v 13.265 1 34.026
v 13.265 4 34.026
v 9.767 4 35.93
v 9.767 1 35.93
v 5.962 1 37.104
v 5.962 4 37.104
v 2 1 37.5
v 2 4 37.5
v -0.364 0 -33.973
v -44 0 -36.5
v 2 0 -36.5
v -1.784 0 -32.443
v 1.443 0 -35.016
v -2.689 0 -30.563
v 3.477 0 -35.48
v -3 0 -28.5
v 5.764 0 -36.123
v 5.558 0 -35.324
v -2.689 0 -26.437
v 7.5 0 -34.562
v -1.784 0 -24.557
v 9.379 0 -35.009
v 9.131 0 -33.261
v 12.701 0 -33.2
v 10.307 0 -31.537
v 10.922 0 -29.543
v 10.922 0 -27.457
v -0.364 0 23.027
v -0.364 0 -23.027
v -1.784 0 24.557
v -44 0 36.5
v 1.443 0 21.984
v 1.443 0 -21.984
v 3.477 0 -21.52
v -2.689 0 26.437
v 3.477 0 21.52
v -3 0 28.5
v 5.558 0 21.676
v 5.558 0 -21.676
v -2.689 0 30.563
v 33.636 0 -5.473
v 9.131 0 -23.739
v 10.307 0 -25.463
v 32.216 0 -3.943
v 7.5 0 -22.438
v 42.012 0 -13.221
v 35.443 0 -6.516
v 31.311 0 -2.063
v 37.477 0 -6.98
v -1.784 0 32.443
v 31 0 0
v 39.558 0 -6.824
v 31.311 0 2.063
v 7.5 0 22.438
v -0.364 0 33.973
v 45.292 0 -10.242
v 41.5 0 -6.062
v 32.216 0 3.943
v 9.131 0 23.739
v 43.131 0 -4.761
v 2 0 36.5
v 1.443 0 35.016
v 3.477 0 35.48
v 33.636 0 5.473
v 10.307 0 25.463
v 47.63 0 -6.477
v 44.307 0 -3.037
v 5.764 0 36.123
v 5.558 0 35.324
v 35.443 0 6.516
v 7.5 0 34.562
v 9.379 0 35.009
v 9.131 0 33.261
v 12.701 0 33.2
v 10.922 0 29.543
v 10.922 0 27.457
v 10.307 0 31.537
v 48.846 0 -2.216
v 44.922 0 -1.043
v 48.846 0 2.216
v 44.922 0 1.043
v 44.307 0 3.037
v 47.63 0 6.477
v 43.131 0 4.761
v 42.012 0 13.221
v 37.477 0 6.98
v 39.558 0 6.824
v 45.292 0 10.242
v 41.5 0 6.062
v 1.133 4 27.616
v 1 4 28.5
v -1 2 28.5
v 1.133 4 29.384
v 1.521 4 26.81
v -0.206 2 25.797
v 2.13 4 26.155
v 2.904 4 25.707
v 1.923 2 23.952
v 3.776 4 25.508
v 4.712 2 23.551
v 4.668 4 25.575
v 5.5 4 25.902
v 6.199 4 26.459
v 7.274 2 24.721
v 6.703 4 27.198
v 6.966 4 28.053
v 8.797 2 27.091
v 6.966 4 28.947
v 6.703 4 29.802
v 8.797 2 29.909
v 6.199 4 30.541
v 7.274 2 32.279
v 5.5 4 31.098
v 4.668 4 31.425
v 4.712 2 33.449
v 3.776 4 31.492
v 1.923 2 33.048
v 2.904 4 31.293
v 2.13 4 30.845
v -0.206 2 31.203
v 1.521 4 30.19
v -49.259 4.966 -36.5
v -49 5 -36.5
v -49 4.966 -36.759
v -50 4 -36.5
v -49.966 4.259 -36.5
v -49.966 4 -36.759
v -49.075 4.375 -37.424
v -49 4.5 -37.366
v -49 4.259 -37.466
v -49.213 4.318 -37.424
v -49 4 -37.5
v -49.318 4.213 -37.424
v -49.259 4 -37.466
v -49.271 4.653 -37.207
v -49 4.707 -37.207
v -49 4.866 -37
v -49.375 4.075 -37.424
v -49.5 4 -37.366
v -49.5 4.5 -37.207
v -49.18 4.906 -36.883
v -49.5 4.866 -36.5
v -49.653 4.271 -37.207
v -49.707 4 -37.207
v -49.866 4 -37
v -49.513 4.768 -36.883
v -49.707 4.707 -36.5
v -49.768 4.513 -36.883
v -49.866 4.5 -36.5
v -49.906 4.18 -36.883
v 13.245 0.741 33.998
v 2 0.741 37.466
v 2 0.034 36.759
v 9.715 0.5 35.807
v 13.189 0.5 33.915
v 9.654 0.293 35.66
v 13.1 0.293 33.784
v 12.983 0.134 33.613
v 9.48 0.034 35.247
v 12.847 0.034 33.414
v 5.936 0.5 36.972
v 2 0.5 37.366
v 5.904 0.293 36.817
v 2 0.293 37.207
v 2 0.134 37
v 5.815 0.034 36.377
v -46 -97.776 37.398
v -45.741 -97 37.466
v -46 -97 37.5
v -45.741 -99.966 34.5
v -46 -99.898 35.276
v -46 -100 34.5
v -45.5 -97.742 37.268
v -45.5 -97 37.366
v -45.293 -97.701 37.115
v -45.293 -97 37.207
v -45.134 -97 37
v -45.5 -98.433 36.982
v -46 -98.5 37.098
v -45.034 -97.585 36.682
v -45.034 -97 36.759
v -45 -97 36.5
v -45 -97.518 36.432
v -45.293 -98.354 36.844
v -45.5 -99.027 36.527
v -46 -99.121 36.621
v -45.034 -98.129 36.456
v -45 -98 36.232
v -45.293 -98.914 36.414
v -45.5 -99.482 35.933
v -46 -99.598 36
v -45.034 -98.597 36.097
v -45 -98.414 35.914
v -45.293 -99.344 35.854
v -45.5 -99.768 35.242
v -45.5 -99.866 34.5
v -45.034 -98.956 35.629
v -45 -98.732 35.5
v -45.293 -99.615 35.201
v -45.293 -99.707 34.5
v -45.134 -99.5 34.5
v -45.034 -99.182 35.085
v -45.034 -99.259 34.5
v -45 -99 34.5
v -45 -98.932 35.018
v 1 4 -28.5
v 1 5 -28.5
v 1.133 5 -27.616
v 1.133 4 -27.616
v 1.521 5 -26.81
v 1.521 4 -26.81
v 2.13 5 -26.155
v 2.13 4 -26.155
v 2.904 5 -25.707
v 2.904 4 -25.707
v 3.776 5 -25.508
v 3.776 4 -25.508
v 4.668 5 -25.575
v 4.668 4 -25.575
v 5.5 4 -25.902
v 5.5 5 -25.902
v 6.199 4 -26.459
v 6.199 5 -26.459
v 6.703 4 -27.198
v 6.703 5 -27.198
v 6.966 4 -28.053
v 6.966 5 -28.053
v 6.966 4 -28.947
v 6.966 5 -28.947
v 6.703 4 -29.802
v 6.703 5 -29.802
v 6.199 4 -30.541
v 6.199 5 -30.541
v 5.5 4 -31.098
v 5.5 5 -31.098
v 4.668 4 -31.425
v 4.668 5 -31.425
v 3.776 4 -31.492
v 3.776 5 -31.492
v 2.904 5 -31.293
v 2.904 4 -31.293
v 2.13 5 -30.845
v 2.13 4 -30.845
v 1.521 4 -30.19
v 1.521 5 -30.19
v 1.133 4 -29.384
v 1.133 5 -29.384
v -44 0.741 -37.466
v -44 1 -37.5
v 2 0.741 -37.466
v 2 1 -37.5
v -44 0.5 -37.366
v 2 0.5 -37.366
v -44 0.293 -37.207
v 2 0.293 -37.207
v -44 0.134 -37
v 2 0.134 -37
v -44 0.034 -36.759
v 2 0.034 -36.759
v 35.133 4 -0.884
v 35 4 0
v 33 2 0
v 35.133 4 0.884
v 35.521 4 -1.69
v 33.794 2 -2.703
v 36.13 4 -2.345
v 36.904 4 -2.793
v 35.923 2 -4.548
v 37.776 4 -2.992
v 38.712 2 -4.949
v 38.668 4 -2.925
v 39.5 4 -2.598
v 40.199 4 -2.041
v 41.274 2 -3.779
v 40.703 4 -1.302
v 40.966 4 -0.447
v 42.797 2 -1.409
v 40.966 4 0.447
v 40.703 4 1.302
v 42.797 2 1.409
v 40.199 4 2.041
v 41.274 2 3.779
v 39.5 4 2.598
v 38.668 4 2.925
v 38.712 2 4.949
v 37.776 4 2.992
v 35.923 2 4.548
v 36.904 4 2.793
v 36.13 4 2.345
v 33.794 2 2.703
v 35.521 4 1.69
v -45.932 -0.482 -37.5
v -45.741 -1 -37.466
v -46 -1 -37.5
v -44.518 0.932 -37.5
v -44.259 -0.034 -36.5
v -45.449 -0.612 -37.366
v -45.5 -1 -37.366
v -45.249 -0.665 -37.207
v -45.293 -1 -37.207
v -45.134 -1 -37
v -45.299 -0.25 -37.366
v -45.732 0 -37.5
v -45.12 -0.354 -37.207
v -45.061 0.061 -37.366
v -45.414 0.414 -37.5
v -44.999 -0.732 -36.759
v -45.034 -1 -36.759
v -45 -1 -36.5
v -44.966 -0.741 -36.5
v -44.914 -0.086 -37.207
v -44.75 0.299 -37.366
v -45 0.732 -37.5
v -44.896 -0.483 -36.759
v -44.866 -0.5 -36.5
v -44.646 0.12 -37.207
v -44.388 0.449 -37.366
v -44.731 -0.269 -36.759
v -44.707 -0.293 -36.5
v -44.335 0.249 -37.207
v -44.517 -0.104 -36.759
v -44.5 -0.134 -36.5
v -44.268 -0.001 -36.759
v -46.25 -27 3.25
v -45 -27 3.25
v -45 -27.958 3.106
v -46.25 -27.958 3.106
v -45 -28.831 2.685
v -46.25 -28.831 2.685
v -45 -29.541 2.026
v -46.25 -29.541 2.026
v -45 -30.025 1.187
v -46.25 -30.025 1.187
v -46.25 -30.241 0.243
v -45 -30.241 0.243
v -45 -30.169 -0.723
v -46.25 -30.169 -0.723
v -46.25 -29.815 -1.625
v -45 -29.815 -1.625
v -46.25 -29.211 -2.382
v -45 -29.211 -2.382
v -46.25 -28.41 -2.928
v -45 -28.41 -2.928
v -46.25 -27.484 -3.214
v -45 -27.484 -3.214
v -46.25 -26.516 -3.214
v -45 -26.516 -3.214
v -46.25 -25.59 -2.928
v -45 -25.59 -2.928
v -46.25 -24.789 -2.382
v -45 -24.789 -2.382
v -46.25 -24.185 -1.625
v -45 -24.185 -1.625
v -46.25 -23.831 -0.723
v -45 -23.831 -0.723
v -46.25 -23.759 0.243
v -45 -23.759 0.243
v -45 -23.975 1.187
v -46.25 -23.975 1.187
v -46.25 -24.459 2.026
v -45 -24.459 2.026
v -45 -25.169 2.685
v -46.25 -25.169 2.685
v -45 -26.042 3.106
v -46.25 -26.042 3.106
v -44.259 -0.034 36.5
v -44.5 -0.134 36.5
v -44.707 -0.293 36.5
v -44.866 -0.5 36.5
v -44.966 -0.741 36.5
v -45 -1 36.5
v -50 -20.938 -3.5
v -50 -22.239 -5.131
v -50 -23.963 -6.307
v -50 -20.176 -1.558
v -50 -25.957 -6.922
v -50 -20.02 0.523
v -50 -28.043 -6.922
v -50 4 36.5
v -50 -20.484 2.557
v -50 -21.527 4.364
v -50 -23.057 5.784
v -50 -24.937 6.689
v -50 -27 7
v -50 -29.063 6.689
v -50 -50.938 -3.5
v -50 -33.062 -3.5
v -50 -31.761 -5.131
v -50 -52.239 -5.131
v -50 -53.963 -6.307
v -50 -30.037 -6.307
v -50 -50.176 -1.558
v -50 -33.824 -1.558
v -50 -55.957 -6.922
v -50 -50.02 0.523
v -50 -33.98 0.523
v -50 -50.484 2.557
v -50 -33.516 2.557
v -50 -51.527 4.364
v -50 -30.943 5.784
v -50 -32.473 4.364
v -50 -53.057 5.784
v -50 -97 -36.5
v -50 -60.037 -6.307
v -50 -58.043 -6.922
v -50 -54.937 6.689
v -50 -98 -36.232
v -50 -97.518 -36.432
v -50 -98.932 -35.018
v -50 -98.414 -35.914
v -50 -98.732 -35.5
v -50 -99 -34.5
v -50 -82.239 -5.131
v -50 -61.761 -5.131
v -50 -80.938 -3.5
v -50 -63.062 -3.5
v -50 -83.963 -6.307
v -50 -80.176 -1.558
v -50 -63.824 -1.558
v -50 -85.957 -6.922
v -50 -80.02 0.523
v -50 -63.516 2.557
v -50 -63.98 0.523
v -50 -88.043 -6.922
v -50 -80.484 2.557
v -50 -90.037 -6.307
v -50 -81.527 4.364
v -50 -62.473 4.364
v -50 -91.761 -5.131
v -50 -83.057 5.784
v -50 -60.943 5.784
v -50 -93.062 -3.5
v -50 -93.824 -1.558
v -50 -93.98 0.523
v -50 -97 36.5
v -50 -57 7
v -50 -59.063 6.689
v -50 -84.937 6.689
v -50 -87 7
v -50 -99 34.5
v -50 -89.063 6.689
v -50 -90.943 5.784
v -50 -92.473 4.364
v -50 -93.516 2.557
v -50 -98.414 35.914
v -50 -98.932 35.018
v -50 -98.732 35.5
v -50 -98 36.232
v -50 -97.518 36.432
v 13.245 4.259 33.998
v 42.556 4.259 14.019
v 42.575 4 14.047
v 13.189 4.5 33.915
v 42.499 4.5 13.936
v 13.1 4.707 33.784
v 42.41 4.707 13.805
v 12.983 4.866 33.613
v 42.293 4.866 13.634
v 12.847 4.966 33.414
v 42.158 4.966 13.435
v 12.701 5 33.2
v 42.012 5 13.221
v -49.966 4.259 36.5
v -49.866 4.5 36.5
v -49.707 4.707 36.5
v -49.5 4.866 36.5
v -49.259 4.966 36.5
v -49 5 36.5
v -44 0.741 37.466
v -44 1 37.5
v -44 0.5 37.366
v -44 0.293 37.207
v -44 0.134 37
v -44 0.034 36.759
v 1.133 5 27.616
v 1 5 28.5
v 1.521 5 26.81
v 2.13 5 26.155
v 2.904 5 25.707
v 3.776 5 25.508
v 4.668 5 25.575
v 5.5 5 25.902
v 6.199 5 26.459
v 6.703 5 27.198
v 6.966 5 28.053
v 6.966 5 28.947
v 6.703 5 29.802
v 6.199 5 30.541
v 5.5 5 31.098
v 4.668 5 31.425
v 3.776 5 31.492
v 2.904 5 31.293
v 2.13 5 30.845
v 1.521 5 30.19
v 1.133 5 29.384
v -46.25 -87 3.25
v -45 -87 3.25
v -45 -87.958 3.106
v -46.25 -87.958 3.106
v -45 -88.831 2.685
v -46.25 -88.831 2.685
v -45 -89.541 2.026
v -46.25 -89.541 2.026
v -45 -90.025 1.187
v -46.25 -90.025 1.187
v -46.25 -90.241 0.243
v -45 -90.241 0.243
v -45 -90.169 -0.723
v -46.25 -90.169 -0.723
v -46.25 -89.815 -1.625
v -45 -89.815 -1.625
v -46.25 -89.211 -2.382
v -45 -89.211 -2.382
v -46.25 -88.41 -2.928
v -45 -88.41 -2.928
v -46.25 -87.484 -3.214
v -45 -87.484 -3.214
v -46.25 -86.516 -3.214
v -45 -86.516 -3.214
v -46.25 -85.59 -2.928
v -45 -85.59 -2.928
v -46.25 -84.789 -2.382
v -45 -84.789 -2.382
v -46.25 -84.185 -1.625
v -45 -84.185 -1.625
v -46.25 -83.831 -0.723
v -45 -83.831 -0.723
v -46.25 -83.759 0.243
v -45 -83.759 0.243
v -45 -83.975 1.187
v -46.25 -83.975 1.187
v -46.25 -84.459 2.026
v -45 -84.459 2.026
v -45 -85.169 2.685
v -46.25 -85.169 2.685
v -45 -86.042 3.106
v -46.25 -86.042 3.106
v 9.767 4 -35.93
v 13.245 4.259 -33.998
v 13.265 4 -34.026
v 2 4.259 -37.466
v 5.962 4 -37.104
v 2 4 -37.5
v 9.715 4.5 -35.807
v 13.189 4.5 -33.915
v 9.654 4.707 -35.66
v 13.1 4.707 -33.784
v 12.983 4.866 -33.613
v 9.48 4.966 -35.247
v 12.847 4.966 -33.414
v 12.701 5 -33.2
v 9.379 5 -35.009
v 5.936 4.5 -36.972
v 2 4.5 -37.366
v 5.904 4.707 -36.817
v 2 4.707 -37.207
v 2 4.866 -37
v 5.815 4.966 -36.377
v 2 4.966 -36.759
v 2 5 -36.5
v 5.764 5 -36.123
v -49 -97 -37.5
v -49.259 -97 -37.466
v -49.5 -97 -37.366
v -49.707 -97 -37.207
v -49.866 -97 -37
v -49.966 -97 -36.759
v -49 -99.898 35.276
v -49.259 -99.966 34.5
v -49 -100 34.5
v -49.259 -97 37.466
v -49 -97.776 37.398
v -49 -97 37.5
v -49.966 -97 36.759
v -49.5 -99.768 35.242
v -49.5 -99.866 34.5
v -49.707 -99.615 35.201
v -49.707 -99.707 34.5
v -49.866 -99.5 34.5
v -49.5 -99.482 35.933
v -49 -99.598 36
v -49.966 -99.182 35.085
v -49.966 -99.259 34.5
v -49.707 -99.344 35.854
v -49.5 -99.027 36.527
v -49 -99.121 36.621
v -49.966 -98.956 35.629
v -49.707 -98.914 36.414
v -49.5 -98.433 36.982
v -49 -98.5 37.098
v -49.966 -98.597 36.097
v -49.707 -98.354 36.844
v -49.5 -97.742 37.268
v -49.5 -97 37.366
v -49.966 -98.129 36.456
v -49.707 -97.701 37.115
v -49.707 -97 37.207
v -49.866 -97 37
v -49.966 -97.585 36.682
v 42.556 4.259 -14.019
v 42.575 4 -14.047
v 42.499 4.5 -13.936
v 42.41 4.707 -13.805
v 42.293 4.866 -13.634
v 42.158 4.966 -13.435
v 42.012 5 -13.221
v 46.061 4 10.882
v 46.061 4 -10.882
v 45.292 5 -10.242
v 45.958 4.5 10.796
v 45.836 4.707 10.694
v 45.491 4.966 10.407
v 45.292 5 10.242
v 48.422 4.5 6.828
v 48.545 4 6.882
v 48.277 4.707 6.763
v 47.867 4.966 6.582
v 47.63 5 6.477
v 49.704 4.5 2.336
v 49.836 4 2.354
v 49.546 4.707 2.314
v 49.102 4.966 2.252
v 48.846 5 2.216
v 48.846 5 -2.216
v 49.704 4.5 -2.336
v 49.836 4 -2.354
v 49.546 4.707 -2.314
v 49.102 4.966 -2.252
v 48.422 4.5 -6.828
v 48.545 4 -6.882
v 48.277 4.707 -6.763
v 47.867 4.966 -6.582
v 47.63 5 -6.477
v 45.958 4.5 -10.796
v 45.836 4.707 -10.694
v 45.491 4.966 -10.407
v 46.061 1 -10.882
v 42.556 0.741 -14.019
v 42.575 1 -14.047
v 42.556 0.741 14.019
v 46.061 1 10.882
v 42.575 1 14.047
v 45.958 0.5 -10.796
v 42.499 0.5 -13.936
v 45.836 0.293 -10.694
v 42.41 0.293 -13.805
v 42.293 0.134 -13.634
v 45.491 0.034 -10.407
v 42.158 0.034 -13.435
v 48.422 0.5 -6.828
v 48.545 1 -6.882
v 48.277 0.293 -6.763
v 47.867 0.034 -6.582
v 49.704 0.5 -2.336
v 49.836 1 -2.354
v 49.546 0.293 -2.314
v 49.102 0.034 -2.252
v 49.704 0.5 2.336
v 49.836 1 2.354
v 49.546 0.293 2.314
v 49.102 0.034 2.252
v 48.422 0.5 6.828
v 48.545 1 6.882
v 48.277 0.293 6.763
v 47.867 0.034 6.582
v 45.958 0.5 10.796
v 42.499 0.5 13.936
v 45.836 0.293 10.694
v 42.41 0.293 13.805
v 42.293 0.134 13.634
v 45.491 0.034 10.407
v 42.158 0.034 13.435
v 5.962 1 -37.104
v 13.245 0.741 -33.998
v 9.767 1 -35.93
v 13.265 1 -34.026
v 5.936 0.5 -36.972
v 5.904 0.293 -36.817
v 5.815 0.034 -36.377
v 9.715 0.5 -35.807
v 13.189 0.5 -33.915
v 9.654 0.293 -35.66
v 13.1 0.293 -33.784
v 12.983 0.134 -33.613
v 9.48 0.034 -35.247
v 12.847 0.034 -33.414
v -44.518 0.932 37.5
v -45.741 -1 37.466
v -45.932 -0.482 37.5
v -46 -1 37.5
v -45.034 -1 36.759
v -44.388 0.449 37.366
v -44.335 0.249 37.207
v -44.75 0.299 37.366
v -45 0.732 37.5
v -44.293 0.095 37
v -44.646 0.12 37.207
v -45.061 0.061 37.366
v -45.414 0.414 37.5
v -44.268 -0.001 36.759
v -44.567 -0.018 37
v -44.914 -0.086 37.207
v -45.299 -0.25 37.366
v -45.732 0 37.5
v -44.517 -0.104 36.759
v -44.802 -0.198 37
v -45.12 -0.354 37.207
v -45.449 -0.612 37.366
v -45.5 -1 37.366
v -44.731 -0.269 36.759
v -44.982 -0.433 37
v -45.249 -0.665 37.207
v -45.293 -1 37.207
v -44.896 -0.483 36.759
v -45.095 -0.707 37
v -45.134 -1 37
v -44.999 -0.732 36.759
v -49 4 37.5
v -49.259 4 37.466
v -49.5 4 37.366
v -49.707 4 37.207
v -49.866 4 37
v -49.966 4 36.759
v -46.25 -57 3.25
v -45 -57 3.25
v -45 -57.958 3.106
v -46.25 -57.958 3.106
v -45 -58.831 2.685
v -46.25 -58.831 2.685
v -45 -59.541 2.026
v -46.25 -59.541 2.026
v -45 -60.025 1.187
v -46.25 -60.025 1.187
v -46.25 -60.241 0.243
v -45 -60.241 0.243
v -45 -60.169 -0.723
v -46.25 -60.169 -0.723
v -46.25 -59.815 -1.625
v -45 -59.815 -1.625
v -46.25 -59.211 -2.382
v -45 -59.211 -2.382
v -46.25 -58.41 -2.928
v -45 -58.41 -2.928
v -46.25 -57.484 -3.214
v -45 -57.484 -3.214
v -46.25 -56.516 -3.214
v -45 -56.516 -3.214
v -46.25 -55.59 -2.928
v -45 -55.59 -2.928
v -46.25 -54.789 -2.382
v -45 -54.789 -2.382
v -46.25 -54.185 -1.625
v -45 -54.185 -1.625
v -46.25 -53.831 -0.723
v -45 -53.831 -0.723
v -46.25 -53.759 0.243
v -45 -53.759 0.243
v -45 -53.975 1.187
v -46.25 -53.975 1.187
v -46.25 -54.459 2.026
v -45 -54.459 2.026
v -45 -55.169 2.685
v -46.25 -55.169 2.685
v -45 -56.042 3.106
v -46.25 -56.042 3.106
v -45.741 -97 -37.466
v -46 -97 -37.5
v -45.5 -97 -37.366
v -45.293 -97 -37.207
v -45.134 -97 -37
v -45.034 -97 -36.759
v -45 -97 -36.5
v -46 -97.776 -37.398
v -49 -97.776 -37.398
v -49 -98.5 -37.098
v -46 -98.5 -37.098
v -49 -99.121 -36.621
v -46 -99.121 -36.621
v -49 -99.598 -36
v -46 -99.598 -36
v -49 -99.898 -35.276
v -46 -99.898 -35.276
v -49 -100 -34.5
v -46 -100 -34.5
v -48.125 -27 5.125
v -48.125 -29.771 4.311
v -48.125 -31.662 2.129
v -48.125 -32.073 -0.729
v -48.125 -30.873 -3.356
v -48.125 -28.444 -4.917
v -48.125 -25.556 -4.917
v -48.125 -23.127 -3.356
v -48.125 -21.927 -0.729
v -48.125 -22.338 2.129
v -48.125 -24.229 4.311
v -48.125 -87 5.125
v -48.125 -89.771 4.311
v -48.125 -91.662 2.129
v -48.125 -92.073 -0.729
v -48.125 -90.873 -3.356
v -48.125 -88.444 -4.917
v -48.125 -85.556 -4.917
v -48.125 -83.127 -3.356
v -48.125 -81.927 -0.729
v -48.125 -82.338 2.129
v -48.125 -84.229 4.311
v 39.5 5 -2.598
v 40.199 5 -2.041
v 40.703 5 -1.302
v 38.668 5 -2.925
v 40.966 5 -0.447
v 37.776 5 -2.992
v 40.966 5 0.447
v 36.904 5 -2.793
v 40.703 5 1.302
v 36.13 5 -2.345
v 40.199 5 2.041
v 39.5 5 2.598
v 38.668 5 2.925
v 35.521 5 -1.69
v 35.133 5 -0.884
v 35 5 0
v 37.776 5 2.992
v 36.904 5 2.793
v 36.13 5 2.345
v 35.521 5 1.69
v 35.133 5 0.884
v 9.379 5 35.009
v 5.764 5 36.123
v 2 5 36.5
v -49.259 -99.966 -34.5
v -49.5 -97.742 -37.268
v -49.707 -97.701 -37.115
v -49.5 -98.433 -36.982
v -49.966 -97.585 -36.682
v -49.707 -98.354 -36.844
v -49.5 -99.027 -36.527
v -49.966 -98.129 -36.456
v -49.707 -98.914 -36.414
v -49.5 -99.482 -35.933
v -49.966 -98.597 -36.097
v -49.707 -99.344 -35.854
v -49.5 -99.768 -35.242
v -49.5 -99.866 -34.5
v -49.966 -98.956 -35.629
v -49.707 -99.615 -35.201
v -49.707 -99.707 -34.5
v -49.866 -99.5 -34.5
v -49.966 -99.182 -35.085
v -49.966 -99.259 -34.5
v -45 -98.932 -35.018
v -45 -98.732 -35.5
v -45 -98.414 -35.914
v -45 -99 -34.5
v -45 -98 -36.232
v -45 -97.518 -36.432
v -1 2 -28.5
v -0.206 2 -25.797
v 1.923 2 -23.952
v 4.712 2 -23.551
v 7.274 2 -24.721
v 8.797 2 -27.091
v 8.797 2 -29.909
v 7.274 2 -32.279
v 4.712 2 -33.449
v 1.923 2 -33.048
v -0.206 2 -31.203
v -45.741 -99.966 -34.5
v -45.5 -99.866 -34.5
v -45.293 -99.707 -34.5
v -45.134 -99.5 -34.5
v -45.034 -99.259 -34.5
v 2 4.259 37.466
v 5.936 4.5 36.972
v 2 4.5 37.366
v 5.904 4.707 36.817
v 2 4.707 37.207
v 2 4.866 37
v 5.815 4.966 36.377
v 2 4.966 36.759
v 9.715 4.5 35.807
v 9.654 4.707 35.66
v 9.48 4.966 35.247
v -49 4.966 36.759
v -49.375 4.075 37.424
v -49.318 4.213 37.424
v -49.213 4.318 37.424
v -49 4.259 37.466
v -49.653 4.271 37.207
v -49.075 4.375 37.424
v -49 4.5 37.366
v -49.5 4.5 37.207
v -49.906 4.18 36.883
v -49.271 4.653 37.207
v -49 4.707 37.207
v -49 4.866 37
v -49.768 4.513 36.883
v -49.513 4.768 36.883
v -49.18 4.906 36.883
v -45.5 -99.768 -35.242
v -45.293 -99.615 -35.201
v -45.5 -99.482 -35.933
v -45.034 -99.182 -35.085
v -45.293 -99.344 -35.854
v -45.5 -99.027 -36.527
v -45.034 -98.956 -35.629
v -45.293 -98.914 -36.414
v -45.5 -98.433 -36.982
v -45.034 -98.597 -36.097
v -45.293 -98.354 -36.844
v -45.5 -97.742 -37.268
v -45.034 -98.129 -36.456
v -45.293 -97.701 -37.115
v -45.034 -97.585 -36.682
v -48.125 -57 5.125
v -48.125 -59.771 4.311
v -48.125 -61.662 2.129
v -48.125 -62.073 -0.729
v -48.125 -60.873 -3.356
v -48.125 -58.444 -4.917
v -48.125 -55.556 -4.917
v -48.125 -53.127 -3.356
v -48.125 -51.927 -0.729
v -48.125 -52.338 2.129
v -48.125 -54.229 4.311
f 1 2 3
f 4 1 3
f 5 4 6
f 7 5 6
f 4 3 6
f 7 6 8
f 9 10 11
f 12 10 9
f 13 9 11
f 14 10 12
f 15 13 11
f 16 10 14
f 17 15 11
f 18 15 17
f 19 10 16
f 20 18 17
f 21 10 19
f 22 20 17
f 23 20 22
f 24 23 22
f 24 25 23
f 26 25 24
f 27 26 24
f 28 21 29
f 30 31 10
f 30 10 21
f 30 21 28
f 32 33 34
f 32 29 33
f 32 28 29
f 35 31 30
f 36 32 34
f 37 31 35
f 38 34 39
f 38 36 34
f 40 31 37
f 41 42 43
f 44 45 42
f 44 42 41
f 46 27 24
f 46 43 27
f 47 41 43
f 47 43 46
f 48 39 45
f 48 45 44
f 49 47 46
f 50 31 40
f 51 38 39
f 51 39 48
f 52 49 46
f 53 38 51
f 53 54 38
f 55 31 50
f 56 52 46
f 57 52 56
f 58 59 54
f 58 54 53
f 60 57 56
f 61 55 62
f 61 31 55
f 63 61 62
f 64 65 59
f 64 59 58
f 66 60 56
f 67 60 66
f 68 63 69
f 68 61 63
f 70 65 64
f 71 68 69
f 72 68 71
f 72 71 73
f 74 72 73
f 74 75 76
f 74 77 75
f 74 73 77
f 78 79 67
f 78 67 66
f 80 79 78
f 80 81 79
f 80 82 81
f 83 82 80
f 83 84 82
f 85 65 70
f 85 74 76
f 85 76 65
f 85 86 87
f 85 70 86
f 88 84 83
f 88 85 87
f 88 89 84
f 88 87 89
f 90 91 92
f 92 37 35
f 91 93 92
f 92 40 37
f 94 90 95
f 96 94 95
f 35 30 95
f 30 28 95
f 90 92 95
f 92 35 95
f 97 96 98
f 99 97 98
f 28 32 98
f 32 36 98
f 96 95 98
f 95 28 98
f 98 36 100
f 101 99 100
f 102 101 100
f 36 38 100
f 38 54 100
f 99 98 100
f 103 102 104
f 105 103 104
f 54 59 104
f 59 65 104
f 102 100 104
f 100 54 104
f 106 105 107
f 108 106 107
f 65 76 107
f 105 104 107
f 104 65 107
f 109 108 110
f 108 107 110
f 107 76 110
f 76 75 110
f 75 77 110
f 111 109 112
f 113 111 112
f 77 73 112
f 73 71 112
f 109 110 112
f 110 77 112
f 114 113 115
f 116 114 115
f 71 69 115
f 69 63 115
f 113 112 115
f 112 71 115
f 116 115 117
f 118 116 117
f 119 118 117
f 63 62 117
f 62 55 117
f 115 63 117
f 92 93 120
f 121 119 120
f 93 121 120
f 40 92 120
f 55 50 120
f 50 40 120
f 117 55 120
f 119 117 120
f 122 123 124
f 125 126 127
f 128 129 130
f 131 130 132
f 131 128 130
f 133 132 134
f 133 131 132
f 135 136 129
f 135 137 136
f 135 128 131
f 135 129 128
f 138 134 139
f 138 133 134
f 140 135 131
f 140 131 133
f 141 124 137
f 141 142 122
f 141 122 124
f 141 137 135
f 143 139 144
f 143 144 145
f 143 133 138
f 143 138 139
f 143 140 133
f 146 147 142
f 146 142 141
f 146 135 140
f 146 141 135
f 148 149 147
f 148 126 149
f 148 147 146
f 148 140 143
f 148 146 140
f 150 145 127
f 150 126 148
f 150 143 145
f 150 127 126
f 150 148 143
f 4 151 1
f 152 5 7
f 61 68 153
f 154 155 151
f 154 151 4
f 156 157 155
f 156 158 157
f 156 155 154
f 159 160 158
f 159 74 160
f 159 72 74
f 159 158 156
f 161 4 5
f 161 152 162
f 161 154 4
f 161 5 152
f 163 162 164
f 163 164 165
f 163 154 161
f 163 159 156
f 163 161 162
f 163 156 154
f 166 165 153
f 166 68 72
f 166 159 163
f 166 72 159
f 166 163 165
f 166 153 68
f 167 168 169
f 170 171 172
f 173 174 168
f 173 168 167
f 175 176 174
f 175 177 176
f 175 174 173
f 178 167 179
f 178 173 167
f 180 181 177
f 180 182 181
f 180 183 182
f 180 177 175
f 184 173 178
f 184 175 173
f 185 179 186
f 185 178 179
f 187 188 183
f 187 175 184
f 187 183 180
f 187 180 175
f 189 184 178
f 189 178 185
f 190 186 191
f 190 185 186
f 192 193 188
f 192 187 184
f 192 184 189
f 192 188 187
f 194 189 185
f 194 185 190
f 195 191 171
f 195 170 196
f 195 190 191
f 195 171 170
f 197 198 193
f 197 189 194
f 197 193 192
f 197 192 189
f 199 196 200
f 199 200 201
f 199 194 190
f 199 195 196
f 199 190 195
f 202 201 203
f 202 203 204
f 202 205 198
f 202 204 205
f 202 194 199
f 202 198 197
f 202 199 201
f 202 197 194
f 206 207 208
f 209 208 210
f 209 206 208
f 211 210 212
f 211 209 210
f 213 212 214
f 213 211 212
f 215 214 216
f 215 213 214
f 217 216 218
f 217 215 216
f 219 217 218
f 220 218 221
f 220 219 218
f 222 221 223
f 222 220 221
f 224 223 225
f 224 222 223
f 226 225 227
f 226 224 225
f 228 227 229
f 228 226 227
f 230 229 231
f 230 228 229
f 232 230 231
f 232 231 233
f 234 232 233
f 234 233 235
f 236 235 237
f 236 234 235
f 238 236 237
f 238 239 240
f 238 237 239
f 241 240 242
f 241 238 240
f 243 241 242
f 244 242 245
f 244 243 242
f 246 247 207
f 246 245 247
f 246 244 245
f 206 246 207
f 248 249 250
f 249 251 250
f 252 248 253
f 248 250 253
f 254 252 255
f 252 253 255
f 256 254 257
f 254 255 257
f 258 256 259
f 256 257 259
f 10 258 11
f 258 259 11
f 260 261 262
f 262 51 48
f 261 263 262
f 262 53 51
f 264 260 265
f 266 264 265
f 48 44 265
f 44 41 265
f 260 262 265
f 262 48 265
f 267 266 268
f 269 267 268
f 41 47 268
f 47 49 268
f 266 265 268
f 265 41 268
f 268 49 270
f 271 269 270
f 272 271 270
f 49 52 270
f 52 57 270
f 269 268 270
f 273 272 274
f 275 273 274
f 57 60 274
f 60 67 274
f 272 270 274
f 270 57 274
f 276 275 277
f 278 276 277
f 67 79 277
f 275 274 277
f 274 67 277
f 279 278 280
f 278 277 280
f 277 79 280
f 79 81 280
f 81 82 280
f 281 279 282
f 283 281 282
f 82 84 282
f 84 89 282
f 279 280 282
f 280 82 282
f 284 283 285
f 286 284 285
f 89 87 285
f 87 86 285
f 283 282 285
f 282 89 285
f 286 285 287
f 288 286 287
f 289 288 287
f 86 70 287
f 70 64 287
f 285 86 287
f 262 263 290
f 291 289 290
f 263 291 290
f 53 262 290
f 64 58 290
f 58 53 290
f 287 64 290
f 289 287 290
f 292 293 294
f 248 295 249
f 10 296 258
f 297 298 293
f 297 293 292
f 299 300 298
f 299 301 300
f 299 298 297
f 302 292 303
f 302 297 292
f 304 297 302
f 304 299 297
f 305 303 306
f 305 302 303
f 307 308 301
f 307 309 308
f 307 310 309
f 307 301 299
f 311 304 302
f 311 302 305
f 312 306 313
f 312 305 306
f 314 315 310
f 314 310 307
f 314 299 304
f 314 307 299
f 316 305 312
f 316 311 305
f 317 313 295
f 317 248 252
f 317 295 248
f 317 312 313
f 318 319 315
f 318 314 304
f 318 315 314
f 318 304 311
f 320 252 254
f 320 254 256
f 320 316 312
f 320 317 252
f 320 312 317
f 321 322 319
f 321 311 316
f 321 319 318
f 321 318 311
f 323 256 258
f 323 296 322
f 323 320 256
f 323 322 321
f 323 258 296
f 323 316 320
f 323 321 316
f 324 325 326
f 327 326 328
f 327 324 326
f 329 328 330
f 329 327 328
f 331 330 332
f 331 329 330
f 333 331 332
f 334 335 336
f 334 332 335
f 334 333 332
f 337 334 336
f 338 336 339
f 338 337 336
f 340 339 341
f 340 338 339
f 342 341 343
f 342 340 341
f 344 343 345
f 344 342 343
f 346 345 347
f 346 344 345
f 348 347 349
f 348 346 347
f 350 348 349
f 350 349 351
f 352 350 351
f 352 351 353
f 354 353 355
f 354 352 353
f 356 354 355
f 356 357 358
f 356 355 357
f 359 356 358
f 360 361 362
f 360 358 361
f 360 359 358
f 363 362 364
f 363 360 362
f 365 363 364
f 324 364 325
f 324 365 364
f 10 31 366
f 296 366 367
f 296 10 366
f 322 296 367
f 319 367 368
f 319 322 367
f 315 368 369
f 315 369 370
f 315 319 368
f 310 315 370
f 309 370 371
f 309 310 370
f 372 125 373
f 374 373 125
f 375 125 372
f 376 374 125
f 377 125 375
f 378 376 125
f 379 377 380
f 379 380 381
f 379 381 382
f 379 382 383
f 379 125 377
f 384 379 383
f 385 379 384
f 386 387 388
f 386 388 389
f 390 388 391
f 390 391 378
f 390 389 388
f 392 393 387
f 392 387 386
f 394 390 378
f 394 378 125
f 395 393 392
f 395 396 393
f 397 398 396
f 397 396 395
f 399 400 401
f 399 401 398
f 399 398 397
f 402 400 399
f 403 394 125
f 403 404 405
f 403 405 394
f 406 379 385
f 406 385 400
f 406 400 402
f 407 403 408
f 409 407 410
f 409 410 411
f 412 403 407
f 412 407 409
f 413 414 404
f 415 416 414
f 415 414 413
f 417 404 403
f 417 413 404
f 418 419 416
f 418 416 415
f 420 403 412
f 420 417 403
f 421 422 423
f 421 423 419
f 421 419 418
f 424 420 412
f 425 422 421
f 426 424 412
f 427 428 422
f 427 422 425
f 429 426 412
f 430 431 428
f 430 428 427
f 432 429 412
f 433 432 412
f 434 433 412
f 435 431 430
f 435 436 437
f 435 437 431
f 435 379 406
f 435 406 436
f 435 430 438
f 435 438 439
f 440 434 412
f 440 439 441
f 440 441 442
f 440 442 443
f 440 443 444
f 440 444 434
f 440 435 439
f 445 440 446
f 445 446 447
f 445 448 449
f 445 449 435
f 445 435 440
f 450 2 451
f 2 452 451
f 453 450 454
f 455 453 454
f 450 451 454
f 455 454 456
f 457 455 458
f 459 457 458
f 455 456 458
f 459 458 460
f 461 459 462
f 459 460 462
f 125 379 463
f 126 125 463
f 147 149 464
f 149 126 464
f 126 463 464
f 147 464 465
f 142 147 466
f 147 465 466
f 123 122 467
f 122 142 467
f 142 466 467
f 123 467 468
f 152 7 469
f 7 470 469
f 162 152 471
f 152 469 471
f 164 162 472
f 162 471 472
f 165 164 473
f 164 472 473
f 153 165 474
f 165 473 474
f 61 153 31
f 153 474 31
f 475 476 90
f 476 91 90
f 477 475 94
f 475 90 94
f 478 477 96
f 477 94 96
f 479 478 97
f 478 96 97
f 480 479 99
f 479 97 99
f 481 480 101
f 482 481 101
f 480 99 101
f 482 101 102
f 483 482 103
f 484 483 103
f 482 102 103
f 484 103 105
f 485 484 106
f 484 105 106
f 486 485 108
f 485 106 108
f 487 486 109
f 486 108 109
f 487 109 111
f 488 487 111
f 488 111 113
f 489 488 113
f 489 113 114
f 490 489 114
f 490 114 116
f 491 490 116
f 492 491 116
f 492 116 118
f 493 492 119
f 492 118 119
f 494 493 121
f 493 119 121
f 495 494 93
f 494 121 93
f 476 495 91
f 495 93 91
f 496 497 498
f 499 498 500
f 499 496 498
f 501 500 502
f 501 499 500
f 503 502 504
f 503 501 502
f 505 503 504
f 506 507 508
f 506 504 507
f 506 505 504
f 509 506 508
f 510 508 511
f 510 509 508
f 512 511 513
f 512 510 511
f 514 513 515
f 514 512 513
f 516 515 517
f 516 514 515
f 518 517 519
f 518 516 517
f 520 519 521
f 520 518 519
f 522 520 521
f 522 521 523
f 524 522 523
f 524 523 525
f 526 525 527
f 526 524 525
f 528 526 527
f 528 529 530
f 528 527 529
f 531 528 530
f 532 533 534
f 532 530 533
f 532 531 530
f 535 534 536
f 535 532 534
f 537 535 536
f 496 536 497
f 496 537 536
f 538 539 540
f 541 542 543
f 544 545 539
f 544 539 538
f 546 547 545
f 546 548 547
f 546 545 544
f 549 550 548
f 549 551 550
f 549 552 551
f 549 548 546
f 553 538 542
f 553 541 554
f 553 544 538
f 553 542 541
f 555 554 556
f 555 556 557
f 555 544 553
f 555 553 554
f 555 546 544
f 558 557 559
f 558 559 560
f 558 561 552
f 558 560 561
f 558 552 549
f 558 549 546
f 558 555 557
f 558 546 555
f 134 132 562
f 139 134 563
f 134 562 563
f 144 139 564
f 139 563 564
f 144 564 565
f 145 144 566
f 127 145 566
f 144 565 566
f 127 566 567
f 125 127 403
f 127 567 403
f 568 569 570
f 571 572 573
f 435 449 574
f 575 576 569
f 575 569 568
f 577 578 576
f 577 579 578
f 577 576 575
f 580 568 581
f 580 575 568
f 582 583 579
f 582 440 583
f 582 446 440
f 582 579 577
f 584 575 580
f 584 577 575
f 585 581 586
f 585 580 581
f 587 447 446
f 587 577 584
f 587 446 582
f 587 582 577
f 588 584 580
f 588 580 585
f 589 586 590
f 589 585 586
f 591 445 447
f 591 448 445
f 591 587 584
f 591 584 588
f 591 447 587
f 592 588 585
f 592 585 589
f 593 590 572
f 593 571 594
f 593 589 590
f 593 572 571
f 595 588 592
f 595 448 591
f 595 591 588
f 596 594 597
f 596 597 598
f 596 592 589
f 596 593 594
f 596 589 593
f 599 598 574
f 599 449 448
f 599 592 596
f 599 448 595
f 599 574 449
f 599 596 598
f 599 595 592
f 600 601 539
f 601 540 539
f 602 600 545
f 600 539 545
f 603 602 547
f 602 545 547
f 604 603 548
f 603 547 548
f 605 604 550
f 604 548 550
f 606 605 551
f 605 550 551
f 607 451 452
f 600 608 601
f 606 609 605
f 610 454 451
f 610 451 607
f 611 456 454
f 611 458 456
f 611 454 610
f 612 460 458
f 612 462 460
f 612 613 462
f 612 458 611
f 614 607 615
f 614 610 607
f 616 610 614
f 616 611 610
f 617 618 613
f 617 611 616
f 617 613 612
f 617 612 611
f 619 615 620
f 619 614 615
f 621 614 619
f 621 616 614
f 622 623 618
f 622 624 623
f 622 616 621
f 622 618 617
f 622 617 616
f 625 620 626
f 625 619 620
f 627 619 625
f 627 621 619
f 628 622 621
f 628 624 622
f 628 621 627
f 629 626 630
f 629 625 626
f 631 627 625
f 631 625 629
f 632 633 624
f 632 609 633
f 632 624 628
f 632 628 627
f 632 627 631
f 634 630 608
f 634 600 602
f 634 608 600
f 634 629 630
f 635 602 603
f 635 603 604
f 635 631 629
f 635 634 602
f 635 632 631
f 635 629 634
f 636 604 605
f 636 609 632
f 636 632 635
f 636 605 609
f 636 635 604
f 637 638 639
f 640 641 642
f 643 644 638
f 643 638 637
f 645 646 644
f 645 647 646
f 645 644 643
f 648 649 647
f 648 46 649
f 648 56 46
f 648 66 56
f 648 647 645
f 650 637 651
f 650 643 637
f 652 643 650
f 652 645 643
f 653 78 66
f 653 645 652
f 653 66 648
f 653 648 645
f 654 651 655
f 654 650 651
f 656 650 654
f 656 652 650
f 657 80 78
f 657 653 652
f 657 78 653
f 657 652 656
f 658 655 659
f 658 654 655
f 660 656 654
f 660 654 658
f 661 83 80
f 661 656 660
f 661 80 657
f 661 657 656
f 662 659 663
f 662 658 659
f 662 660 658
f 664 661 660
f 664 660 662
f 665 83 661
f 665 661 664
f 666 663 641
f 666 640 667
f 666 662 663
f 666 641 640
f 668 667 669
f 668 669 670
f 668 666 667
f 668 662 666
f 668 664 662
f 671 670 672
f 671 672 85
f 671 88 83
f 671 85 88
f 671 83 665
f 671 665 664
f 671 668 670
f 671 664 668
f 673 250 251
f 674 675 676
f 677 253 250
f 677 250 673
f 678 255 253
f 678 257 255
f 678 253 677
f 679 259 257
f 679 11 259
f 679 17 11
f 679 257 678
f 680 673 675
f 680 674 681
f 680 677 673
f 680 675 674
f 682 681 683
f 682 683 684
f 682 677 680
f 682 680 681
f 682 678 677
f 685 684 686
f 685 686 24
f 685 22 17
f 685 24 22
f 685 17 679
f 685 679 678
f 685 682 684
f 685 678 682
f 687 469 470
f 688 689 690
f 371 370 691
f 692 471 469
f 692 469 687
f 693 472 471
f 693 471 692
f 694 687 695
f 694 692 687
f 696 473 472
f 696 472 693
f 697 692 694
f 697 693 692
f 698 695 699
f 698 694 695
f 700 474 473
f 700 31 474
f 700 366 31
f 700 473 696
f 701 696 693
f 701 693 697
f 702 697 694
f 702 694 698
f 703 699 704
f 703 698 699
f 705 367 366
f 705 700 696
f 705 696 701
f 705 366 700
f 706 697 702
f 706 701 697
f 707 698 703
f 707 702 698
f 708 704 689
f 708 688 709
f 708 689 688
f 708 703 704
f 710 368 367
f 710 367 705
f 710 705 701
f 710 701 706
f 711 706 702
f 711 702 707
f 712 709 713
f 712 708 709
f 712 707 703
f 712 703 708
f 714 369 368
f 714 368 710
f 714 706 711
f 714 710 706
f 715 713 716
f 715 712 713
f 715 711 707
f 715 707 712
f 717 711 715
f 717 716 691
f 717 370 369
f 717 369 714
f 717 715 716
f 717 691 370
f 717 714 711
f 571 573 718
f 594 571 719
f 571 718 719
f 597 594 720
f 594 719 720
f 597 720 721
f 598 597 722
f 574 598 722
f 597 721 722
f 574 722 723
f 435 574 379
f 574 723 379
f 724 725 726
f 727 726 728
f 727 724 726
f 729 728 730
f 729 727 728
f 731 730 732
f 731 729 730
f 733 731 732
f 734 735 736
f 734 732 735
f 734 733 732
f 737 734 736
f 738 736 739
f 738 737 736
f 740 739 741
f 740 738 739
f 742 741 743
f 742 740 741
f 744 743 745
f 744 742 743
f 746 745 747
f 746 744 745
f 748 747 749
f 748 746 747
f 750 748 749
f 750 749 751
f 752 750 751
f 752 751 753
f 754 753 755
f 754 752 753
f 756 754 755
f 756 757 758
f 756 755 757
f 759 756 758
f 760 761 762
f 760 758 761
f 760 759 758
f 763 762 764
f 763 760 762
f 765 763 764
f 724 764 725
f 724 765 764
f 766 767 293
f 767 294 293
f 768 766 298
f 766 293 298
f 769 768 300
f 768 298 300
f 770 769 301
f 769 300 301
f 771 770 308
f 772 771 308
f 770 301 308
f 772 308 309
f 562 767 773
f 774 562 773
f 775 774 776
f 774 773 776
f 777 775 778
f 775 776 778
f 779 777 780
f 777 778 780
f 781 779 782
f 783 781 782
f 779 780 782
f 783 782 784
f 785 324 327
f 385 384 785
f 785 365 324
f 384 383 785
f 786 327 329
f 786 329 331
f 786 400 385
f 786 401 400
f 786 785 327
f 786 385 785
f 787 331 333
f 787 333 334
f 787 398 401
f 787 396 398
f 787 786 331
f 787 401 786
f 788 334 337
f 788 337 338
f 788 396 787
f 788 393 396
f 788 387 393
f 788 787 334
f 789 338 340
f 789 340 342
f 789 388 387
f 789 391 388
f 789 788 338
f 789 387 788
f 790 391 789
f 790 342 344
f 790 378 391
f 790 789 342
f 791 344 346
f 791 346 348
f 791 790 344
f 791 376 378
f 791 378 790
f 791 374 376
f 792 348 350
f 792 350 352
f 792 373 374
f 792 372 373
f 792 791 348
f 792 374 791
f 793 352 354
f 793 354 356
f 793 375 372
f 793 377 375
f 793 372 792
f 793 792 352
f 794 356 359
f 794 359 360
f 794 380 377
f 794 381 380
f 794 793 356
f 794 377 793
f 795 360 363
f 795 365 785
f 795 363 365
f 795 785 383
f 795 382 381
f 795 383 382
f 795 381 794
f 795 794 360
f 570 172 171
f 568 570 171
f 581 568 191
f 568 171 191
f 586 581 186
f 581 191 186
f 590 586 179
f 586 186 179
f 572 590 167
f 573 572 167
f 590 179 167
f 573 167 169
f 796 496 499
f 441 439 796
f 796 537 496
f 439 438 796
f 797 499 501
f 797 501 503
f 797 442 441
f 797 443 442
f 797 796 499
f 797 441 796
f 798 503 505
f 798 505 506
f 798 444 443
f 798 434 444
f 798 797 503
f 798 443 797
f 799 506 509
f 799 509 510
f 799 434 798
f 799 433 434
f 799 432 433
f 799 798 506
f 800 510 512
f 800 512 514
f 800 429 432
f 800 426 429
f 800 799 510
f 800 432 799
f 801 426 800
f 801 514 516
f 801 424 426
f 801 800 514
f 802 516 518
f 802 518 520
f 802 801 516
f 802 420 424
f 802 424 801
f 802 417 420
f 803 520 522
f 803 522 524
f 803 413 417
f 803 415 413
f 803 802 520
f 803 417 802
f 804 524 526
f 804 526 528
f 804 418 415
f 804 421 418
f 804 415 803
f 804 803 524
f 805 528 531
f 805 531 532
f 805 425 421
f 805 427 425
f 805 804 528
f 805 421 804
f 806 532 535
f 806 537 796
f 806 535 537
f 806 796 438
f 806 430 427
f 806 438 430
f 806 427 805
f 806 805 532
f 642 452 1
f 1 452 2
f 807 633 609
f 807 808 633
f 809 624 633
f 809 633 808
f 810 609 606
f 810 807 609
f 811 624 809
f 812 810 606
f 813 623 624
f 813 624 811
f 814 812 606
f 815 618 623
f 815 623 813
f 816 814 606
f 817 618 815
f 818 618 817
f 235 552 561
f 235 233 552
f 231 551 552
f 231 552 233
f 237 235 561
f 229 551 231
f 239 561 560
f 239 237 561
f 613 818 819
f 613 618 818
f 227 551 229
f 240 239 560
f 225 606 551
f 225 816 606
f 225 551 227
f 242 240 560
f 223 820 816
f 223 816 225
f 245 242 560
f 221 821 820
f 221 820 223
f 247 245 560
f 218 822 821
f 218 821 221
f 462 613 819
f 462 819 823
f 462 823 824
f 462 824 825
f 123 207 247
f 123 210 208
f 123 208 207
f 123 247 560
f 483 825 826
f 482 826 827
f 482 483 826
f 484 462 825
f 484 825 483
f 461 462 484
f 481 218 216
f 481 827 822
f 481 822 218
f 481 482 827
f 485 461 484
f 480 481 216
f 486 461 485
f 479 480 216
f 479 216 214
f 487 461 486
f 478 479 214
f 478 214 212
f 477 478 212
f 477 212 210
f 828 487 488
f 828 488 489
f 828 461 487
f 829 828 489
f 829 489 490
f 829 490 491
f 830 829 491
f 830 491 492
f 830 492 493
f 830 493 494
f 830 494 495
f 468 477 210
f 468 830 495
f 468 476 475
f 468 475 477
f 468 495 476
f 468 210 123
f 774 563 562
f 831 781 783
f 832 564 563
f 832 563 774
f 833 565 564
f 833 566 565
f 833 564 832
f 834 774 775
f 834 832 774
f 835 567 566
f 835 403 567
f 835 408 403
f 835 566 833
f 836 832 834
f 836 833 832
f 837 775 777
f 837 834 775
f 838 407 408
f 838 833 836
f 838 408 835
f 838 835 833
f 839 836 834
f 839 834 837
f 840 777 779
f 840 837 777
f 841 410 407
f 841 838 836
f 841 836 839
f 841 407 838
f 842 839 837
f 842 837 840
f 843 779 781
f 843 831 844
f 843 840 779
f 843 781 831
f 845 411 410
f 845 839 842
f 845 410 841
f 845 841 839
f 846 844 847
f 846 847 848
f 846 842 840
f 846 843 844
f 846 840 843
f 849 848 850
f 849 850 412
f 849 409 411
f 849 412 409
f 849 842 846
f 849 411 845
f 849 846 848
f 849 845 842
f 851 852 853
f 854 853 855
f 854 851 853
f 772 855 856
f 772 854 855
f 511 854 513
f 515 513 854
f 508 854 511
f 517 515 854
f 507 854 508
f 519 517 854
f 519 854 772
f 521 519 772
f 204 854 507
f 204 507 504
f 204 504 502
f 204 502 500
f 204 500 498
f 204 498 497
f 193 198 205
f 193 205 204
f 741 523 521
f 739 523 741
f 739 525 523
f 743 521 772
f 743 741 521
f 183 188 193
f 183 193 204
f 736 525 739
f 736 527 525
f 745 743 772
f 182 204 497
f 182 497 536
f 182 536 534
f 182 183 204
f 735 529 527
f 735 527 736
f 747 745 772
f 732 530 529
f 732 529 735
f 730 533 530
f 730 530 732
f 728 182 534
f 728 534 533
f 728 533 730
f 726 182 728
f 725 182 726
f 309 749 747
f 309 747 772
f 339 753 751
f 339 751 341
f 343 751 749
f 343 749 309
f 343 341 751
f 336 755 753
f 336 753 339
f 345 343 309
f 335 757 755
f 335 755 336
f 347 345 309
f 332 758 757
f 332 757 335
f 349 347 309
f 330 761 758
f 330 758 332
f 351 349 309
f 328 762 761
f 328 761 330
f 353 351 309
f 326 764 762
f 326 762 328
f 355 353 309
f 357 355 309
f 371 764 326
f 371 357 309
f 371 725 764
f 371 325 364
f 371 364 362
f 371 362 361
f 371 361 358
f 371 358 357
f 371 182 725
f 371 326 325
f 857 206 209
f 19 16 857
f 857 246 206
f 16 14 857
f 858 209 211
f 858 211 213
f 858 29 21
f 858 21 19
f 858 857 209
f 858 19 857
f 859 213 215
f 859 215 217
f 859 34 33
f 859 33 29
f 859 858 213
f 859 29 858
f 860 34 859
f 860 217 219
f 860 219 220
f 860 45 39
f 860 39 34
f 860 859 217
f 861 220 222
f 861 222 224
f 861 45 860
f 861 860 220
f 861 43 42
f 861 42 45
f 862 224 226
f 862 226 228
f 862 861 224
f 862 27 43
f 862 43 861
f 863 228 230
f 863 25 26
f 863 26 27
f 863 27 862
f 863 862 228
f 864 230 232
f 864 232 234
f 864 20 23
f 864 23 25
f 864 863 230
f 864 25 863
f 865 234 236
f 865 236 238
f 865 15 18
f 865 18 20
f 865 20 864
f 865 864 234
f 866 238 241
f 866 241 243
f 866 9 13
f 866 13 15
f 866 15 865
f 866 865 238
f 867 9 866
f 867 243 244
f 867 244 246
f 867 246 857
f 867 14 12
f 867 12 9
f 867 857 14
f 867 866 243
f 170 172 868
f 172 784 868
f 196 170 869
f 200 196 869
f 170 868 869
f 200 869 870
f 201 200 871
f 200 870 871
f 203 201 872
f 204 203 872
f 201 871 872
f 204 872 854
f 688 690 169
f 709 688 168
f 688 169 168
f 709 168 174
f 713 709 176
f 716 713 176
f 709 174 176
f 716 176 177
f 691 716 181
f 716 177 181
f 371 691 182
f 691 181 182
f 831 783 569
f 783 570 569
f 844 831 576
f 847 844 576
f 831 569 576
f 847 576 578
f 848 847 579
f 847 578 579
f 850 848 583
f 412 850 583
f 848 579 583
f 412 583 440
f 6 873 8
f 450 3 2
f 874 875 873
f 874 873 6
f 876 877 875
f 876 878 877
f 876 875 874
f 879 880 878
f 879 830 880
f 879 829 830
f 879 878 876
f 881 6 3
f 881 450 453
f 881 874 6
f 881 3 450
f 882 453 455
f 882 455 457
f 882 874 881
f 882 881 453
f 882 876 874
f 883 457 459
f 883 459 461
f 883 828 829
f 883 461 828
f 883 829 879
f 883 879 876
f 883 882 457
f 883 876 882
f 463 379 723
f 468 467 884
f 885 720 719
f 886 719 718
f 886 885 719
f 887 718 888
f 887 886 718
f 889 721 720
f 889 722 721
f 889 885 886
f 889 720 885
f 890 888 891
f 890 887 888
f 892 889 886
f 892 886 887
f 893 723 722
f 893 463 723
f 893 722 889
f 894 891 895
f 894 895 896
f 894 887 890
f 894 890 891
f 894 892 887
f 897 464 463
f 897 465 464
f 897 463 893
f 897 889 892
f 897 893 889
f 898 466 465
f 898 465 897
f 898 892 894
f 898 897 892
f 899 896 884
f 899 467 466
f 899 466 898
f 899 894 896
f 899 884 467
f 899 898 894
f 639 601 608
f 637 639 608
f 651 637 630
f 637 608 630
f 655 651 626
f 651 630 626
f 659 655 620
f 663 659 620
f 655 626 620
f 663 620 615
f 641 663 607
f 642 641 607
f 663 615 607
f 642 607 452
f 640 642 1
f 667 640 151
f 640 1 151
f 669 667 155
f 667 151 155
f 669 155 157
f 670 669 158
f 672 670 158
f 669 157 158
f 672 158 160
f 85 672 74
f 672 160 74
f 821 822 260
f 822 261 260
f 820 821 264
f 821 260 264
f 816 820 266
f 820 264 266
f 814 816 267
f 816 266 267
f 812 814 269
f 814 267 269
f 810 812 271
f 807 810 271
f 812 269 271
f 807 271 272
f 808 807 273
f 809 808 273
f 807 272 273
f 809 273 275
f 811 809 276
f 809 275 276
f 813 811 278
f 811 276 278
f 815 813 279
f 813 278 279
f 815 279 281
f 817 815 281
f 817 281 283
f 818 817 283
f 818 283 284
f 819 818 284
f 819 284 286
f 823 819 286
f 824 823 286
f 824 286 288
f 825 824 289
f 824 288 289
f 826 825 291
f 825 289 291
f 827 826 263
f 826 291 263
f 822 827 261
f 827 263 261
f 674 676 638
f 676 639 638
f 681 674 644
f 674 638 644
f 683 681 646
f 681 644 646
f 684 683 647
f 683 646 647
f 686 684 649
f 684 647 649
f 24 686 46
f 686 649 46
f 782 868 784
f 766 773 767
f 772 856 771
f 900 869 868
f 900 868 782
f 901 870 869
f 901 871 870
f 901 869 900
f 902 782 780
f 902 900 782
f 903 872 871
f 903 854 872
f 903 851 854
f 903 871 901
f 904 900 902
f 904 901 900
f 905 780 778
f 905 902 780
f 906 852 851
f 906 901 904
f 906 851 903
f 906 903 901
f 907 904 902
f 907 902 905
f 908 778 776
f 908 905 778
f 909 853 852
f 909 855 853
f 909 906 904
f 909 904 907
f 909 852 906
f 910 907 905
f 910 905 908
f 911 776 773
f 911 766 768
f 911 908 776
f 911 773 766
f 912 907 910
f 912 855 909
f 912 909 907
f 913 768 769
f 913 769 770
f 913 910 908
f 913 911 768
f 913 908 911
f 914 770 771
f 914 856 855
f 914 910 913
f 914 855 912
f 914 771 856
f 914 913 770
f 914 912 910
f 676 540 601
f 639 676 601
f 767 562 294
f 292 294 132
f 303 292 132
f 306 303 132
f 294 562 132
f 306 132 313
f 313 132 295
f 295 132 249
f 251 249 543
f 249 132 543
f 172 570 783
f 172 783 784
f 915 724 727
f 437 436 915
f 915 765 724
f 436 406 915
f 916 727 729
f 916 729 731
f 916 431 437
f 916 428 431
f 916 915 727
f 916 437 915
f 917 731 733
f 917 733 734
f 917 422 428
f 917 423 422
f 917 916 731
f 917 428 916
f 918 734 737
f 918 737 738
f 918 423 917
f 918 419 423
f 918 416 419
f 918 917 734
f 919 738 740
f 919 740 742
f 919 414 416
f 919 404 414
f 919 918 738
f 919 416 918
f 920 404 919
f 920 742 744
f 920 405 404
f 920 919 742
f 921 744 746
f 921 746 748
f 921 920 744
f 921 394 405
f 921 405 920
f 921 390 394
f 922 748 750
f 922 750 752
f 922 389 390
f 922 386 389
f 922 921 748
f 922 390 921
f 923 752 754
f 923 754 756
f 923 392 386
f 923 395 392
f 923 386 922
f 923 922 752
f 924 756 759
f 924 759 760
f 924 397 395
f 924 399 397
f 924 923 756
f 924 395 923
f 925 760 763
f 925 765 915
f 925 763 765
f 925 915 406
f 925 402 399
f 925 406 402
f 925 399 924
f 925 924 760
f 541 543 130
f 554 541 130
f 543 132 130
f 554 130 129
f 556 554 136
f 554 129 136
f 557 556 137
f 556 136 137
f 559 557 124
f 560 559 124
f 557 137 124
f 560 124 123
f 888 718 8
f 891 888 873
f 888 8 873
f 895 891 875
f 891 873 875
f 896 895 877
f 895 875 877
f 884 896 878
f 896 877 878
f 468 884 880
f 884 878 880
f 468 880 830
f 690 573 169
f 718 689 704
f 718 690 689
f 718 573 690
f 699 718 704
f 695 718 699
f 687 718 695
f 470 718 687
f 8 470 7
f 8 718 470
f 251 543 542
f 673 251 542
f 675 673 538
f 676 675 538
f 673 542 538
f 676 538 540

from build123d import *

# Parameters (mm, degrees)
BOSS_EXTRU_1_DEPTH         = 37.5
CONG_1_R                   = 1
CONG_2_R                   = 1
ENL_V_MAT_EXTRU_1_DEPTH    = 106
CONG_3_R                   = 3
CONG_4_R                   = 3
R_P_TITION_LIN_AIRE2_COUNT = 3
R_P_TITION_LIN_AIRE2_PITCH = 30
CONG_5_R                   = 1


with BuildPart() as part:
    # Esquisse1 → Boss.-Extru.1 (new body, symmetric)
    with BuildSketch(Plane.XY):
        Polygon((50, 0), (50, 5), (-50, 5), (-50, -100), (-45, -100), (-45, 0), align=None)
    extrude(amount=BOSS_EXTRU_1_DEPTH, both=True)

    # Congé1
    cong_1_edges = [part.edges().sort_by_distance(p)[0] for p in [
        (-50, 5, 0),
    ]]
    fillet(cong_1_edges, radius=CONG_1_R)

    # Congé2
    cong_2_edges = [part.edges().sort_by_distance(p)[0] for p in [
        (-45, 0, 0),
    ]]
    fillet(cong_2_edges, radius=CONG_2_R)

    # Esquisse2 → Enlèv. mat.-Extru.1 (cut, through all)
    with BuildSketch(Plane(origin=(0, 5, 0), x_dir=(1, 0, 0), z_dir=(0, 1, 0))):
        with BuildLine():
            Line((13.264657274, 34.025964314), (42.574958683, 14.047069667))
            ThreePointArc((42.574958683, 14.047069667), (50, 0), (42.574958683, -14.047069667))
            Line((42.574958683, -14.047069667), (13.264657274, -34.025964314))
            ThreePointArc((13.264657274, -34.025964314), (7.894095084, -36.611767138), (2, -37.5))
            Line((2, -37.5), (2, -49.357406445))
            Line((2, -49.357406445), (93.230488108, -49.357406445))
            Line((93.230488108, -49.357406445), (93.230488108, 49.357406445))
            Line((93.230488108, 49.357406445), (2, 49.357406445))
            Line((2, 49.357406445), (2, 37.5))
            ThreePointArc((2, 37.5), (7.894095084, 36.611767138), (13.264657274, 34.025964314))
        make_face()
    extrude(amount=-ENL_V_MAT_EXTRU_1_DEPTH, mode=Mode.SUBTRACT)

    # Congé3
    cong_3_edges = [part.edges().sort_by_distance(p)[0] for p in [
        (-47.5, -100, -37.5),
    ]]
    fillet(cong_3_edges, radius=CONG_3_R)

    # Congé4
    cong_4_edges = [part.edges().sort_by_distance(p)[0] for p in [
        (-47.5, -100, 37.5),
    ]]
    fillet(cong_4_edges, radius=CONG_4_R)

    # Esquisse5 → Enlèvement de matière-Révolution2 (revolve, cut)
    with BuildSketch(Plane.XY, mode=Mode.PRIVATE) as enl_vement_de_mati_re_r_volution2_sk:
        Polygon((-44, -87), (-44, -83.75), (-46.25, -83.75), (-50, -80), (-50, -87), align=None)
    enl_vement_de_mati_re_r_volution2 = revolve(enl_vement_de_mati_re_r_volution2_sk.sketch.rotate(Axis((-72.134969263, -87, 0), (1, 0, 0)), 90), axis=Axis((-72.134969263, -87, 0), (1, 0, 0)), mode=Mode.SUBTRACT)  # turned: the seam where the file's is

    # Répétition linéaire2: Enlèvement de matière-Révolution2 ×3
    with Locations(*[(0, i * R_P_TITION_LIN_AIRE2_PITCH, 0) for i in range(1, R_P_TITION_LIN_AIRE2_COUNT)]):
        add(enl_vement_de_mati_re_r_volution2, mode=Mode.SUBTRACT)

    # Congé5
    cong_5_edges = [part.edges().sort_by_distance(p)[0] for p in [
        (-50, -46.5, -37.5),
        (-50, -46.5, 37.5),
        (-49.707106781, 4.707106781, -37.5),
        (-49.707106781, 4.707106781, 37.5),
        (-21, 0, -37.5),
        (-21, 0, 37.5),
        (-44.707106781, -0.292893219, 37.5),
        (-44.707106781, -0.292893219, -37.5),
        (-23.5, 5, -37.5),
        (-23.5, 5, 37.5),
        (27.919807978, 0, 24.03651699),
        (50, 0, 0),
        (27.919807978, 0, -24.03651699),
        (7.894095084, 0, 36.611767138),
        (7.894095084, 0, -36.611767138),
        (50, 5, 0),
        (7.894095084, 5, -36.611767138),
        (27.919807978, 5, -24.03651699),
        (27.919807978, 5, 24.03651699),
        (7.894095084, 5, 36.611767138),
        (-45, -49, -37.5),
        (-45, -99.121320344, -36.621320344),
        (-50, -99.121320344, -36.621320344),
        (-45, -49, 37.5),
        (-50, -100, 0),
        (-45, -100, 0),
        (-50, -99.121320344, 36.621320344),
        (-45, -99.121320344, 36.621320344),
    ]]
    fillet(cong_5_edges, radius=CONG_5_R)

    # Esquisse6 → Enlèvement de matière-Révolution3 (revolve, cut)
    with BuildSketch(Plane.XY):
        Polygon((38, 6), (35, 6), (35, 4), (30, -1), (38, -1), align=None)
    revolve(axis=Axis((38, 8.257594869, 0), (0, -1, 0)), mode=Mode.SUBTRACT)

    # Esquisse10 → Enlèvement de matière-Révolution5 (revolve, cut)
    with BuildSketch(Plane.XY.offset(28.5)):
        Polygon((4, 6), (1, 6), (1, 4), (-4, -1), (4, -1), align=None)
    enl_vement_de_mati_re_r_volution5 = revolve(axis=Axis((4, 7.732158055, 28.5), (0, -1, 0)), mode=Mode.SUBTRACT)

    # Symétrie1: Enlèvement de matière-Révolution5 across plane
    add(enl_vement_de_mati_re_r_volution5.mirror(Plane.XY), mode=Mode.SUBTRACT)


solid = part.part
